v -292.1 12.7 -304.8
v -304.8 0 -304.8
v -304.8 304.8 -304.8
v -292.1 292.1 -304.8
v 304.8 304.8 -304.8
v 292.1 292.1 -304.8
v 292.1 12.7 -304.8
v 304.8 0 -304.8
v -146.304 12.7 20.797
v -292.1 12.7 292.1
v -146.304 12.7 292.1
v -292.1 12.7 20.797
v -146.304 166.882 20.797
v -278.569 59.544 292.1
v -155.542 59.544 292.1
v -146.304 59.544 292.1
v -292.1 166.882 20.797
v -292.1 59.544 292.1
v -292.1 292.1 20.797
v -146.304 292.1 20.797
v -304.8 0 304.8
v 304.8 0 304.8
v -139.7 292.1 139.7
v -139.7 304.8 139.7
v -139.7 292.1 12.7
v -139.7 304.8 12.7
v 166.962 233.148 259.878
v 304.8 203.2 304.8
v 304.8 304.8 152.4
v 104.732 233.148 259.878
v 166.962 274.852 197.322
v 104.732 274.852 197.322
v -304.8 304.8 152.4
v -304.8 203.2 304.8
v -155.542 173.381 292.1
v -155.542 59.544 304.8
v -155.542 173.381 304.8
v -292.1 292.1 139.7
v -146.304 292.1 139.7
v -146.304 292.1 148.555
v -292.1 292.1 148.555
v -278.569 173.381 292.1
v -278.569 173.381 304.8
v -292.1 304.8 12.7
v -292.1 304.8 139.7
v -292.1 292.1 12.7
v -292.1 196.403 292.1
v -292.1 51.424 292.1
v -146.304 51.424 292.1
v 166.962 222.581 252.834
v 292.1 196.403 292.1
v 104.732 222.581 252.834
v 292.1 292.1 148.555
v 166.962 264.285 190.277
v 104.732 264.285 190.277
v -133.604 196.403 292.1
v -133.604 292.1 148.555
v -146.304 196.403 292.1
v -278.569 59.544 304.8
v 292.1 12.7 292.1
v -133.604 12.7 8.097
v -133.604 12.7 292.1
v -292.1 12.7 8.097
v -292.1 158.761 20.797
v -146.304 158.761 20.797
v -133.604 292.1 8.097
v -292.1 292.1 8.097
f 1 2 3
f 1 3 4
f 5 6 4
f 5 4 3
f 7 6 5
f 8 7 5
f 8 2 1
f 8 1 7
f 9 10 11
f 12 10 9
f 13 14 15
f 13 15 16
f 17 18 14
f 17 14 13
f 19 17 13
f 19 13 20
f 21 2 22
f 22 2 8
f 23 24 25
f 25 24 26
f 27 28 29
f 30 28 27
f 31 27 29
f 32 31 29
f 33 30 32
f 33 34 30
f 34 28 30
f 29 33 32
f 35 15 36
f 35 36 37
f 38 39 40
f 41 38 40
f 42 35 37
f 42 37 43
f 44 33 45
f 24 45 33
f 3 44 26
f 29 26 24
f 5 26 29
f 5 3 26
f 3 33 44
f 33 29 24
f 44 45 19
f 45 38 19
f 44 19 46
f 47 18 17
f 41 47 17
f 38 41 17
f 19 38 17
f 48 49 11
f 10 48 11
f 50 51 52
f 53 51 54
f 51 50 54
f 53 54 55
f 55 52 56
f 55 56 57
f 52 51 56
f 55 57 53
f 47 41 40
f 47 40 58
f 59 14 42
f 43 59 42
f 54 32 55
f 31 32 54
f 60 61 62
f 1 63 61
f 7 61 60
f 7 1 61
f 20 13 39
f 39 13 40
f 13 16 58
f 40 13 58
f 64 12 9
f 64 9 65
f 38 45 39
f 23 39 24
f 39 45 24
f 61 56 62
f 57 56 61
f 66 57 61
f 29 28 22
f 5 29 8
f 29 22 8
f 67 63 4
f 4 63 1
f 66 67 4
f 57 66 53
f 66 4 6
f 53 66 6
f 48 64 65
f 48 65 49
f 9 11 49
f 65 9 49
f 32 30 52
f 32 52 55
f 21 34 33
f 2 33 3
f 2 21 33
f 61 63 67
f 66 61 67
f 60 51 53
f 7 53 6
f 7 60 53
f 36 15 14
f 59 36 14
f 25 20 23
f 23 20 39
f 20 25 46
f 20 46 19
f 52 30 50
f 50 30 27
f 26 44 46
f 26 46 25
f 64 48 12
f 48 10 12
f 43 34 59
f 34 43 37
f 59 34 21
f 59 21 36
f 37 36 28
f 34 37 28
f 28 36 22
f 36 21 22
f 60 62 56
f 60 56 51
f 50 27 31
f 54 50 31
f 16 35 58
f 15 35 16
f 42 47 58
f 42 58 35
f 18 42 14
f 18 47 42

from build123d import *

# Parameters (mm, degrees)
SKETCH1_W               = 609.6
SKETCH1_H               = 609.6
BOSS_EXTRUDE1_DEPTH     = 304.8
CUT_EXTRUDE2_DEPTH      = 747.6044736
CUT_EXTRUDE2_DEPTH_BACK = 609.6
SHELL11_T               = -12.7
CUT_EXTRUDE5_REACH      = 645.809
SKETCH12_W              = 62.23
SKETCH12_H              = 75.184
CUT_EXTRUDE6_REACH      = 529.929
SKETCH13_W              = 152.4
SKETCH13_H              = 127
BOSS_EXTRUDE2_DEPTH     = 158.496
SHELL13_START           = -292.1
SHELL13_DEPTH           = 145.796
BOSS_EXTRUDE4_REACH     = 738.271
SKETCH16_W              = 123.026433271
SKETCH16_H              = 113.837135886
CUT_EXTRUDE7_DEPTH      = 158.496


# Read off the part's stored shape, not the designer's step: Shell13
with BuildPart() as part:
    # Sketch1 → Boss-Extrude1 (new body)
    with BuildSketch(Plane(origin=(0, 0, 0), x_dir=(1, 0, 0), z_dir=(0, 1, 0))):
        Rectangle(SKETCH1_W, SKETCH1_H)
    extrude(amount=BOSS_EXTRUDE1_DEPTH)

    # Sketch11 → Cut-Extrude2 (cut, two sides: drawn at the far end of the back side and taken through both)
    with BuildSketch(Plane(origin=(304.8, 0, 0), x_dir=(0, 0, -1), z_dir=(1, 0, 0)).offset(-CUT_EXTRUDE2_DEPTH_BACK)):
        Polygon((-1382.429640083, -515.219760055), (-304.8, 203.2), (-152.4, 304.8), (925.229640083, 1023.219760055), (-511.609880028, 3178.47904022), (-2819.269160193, 1640.03952011), align=None)
    extrude(amount=CUT_EXTRUDE2_DEPTH + CUT_EXTRUDE2_DEPTH_BACK, mode=Mode.SUBTRACT)

    # Shell11
    shell11_openings = [part.faces().sort_by_distance(p)[0] for p in [
        (0, 152.4, -304.8),
    ]]
    offset(amount=SHELL11_T, openings=shell11_openings, kind=Kind.INTERSECTION)

    # Sketch12 → Cut-Extrude5 (cut, up to next)
    with BuildSketch(Plane(origin=(0, 281.353846154, 187.569230769), x_dir=(1, 0, 0), z_dir=(0, 0.8320502943378435, 0.5547001962252293)), mode=Mode.PRIVATE) as cut_extrude5_sk1:
        with Locations((135.847083822, -49.312847444)):
            Rectangle(SKETCH12_W, SKETCH12_H)
    cut_extrude5_tool1 = extrude(cut_extrude5_sk1.sketch, amount=-CUT_EXTRUDE5_REACH, mode=Mode.PRIVATE) & part.part
    add(cut_extrude5_tool1.solids().sort_by_distance((135.847084, 254, 228.6))[0], mode=Mode.SUBTRACT)

    # Sketch13 → Cut-Extrude6 (cut, up to next)
    with BuildSketch(Plane(origin=(0, 304.8, 0), x_dir=(1, 0, 0), z_dir=(0, 1, 0)), mode=Mode.PRIVATE) as cut_extrude6_sk1:
        with Locations((-215.9, -76.2)):
            Rectangle(SKETCH13_W, SKETCH13_H)
    cut_extrude6_tool1 = extrude(cut_extrude6_sk1.sketch, amount=-CUT_EXTRUDE6_REACH, mode=Mode.PRIVATE) & part.part
    add(cut_extrude6_tool1.solids().sort_by_distance((-215.9, 304.8, 76.2))[0], mode=Mode.SUBTRACT)

    # Sketch14 → Boss-Extrude2 (add)
    with BuildSketch(Plane(origin=(-292.1, 0, 0), x_dir=(0, 0, -1), z_dir=(1, 0, 0))):
        Polygon((-292.1, 12.7), (-8.096776742, 12.7), (-8.096776742, 292.1), (-148.554749401, 292.1), (-292.1, 196.403166267), align=None)
    extrude(amount=BOSS_EXTRUDE2_DEPTH)

    # Shell13 outline → Shell13 (cut)
    with BuildSketch(Plane.YZ.offset(SHELL13_START)):
        Polygon((196.403166267, 292.1), (12.7, 292.1), (12.7, 20.796776742), (292.1, 20.796776742), (292.1, 148.554749401), align=None)
    extrude(amount=SHELL13_DEPTH, mode=Mode.SUBTRACT)

    # Sketch15 → Boss-Extrude4 (add, up to next)
    with BuildSketch(Plane(origin=(-292.1, 0, 0), x_dir=(0, 0, -1), z_dir=(1, 0, 0)), mode=Mode.PRIVATE) as boss_extrude4_sk1:
        Polygon((-292.1, 59.544316955), (-20.796776742, 166.882273248), (-20.796776742, 158.761495931), (-292.1, 51.423539637), align=None)
    boss_extrude4_tool1 = extrude(boss_extrude4_sk1.sketch, amount=BOSS_EXTRUDE4_REACH, mode=Mode.PRIVATE) - part.part
    add(boss_extrude4_tool1.solids().sort_by_distance((-292.1, 109.152906, 156.448388))[0])

    # Sketch16 → Cut-Extrude7 (cut)
    with BuildSketch(Plane(origin=(0, 0, 292.1), x_dir=(-1, 0, 0), z_dir=(0, 0, -1))):
        with Locations((217.055324109, 116.462884898)):
            Rectangle(SKETCH16_W, SKETCH16_H)
    extrude(amount=-CUT_EXTRUDE7_DEPTH, mode=Mode.SUBTRACT)


solid = part.part
